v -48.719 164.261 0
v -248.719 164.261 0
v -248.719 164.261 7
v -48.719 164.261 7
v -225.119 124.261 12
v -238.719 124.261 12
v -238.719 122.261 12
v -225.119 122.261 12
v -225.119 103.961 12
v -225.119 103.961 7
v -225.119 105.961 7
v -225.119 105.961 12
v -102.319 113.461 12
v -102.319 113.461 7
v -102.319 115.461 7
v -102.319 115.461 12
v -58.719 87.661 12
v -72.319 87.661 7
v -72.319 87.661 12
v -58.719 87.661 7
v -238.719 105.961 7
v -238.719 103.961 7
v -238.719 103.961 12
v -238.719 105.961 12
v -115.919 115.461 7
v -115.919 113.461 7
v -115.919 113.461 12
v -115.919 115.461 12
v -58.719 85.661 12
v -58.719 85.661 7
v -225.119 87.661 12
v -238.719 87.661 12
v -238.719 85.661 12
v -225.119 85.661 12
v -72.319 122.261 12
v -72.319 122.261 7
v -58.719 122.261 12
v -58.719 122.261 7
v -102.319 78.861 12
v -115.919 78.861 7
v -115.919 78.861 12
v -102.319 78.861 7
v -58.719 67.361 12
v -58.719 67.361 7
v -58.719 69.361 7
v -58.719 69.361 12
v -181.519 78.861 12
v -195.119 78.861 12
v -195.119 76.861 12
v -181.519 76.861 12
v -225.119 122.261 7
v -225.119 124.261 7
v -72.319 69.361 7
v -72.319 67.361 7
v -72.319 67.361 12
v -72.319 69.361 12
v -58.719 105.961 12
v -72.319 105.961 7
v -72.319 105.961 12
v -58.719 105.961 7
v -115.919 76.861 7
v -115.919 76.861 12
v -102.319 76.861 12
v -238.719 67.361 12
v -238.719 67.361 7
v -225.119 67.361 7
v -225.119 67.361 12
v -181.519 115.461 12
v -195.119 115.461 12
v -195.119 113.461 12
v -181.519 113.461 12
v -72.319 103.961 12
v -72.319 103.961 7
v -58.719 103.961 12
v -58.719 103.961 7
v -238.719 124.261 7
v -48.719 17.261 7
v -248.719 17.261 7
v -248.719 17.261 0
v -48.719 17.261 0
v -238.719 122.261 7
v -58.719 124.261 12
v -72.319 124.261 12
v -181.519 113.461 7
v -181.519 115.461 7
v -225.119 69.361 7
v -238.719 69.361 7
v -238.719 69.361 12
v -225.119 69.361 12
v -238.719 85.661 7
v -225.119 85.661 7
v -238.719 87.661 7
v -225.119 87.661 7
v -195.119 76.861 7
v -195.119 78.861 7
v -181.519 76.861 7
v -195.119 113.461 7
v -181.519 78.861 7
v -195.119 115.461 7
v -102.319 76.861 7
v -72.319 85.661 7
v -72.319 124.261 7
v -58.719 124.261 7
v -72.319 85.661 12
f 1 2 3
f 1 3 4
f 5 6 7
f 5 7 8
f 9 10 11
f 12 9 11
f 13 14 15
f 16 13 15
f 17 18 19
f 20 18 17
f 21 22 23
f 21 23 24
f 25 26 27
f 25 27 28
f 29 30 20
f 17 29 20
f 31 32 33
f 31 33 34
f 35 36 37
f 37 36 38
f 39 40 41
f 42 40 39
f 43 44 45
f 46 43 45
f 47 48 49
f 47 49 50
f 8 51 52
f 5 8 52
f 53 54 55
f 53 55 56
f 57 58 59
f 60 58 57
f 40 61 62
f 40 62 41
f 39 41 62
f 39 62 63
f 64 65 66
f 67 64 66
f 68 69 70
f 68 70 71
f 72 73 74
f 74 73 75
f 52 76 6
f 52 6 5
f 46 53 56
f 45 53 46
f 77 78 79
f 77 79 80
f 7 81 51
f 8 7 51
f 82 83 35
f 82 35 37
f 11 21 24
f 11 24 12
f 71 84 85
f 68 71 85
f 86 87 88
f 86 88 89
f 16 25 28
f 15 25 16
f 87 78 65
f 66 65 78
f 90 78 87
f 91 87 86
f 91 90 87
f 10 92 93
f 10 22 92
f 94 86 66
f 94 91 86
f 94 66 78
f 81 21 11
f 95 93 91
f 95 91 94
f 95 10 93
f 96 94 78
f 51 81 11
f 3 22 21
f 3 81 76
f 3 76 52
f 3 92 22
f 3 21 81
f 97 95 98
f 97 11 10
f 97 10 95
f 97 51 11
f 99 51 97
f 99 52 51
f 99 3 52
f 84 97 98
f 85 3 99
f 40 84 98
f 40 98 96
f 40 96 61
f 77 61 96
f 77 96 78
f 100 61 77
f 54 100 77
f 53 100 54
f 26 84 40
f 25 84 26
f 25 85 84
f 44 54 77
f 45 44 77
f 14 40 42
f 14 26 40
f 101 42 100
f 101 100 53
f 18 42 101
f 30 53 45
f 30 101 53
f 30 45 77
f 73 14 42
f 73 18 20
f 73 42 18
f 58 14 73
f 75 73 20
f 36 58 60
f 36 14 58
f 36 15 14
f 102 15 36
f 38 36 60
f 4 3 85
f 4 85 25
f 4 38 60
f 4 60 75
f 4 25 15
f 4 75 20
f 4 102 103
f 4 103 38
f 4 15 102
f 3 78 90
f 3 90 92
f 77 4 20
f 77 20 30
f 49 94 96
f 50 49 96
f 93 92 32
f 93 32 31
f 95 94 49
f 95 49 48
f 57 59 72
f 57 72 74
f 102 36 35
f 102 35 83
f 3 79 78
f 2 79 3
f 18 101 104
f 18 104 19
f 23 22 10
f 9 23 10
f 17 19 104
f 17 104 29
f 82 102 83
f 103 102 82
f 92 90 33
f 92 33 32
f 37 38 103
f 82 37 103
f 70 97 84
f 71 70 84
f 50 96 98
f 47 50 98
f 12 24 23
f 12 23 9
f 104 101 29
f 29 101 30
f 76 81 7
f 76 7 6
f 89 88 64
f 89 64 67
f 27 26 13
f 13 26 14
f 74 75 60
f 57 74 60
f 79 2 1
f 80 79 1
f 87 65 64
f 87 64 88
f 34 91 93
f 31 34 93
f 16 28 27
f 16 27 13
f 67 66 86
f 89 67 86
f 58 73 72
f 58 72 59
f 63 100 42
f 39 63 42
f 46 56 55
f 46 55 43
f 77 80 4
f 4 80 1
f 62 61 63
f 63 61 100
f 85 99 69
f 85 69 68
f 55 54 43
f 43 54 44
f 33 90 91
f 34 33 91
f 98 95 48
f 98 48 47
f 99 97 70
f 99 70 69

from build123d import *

# Parameters (mm, degrees)
SKETCH1_W           = 200
SKETCH1_H           = 150
BOSS_EXTRUDE1_DEPTH = 7
SKETCH2_W           = 13.6
SKETCH2_H           = 2
BOSS_EXTRUDE2_DEPTH = 5
SKETCH3_W           = 200
SKETCH3_H           = 7
CUT_EXTRUDE1_DEPTH  = 3


with BuildPart() as part:
    # Sketch1 → Boss-Extrude1 (new body)
    with BuildSketch(Plane.XY):
        with Locations((-148.719211823, 89.261083744)):
            Rectangle(SKETCH1_W, SKETCH1_H)
    extrude(amount=BOSS_EXTRUDE1_DEPTH)

    # Sketch2 → Boss-Extrude2 (add)
    with BuildSketch(Plane.XY.offset(7)):
        with Locations((-109.119211823, 114.461083744)):
            Rectangle(SKETCH2_W, SKETCH2_H)
        with Locations((-65.519211823, 104.961083744)):
            Rectangle(SKETCH2_W, SKETCH2_H)
        with Locations((-65.519211823, 123.261083744)):
            Rectangle(SKETCH2_W, SKETCH2_H)
        with Locations((-65.519211823, 86.661083744)):
            Rectangle(SKETCH2_W, SKETCH2_H)
        with Locations((-65.519211823, 68.361083744)):
            Rectangle(SKETCH2_W, SKETCH2_H)
        with Locations((-231.919211823, 104.961083744)):
            Rectangle(SKETCH2_W, SKETCH2_H)
        with Locations((-231.919211823, 123.261083744)):
            Rectangle(SKETCH2_W, SKETCH2_H)
        with Locations((-231.919211823, 86.661083744)):
            Rectangle(SKETCH2_W, SKETCH2_H)
        with Locations((-231.919211823, 68.361083744)):
            Rectangle(SKETCH2_W, SKETCH2_H)
        with Locations((-188.319211823, 114.461083744)):
            Rectangle(SKETCH2_W, SKETCH2_H)
        with Locations((-188.319211823, 77.861083744)):
            Rectangle(SKETCH2_W, SKETCH2_H)
        with Locations((-109.119211823, 77.861083744)):
            Rectangle(SKETCH2_W, SKETCH2_H)
    extrude(amount=BOSS_EXTRUDE2_DEPTH)

    # Sketch3 → Cut-Extrude1 (cut)
    with BuildSketch(Plane.XZ.offset(-14.261083744)):
        with Locations((-148.719211823, 3.5)):
            Rectangle(SKETCH3_W, SKETCH3_H)
    extrude(amount=-CUT_EXTRUDE1_DEPTH, mode=Mode.SUBTRACT)


solid = part.part
